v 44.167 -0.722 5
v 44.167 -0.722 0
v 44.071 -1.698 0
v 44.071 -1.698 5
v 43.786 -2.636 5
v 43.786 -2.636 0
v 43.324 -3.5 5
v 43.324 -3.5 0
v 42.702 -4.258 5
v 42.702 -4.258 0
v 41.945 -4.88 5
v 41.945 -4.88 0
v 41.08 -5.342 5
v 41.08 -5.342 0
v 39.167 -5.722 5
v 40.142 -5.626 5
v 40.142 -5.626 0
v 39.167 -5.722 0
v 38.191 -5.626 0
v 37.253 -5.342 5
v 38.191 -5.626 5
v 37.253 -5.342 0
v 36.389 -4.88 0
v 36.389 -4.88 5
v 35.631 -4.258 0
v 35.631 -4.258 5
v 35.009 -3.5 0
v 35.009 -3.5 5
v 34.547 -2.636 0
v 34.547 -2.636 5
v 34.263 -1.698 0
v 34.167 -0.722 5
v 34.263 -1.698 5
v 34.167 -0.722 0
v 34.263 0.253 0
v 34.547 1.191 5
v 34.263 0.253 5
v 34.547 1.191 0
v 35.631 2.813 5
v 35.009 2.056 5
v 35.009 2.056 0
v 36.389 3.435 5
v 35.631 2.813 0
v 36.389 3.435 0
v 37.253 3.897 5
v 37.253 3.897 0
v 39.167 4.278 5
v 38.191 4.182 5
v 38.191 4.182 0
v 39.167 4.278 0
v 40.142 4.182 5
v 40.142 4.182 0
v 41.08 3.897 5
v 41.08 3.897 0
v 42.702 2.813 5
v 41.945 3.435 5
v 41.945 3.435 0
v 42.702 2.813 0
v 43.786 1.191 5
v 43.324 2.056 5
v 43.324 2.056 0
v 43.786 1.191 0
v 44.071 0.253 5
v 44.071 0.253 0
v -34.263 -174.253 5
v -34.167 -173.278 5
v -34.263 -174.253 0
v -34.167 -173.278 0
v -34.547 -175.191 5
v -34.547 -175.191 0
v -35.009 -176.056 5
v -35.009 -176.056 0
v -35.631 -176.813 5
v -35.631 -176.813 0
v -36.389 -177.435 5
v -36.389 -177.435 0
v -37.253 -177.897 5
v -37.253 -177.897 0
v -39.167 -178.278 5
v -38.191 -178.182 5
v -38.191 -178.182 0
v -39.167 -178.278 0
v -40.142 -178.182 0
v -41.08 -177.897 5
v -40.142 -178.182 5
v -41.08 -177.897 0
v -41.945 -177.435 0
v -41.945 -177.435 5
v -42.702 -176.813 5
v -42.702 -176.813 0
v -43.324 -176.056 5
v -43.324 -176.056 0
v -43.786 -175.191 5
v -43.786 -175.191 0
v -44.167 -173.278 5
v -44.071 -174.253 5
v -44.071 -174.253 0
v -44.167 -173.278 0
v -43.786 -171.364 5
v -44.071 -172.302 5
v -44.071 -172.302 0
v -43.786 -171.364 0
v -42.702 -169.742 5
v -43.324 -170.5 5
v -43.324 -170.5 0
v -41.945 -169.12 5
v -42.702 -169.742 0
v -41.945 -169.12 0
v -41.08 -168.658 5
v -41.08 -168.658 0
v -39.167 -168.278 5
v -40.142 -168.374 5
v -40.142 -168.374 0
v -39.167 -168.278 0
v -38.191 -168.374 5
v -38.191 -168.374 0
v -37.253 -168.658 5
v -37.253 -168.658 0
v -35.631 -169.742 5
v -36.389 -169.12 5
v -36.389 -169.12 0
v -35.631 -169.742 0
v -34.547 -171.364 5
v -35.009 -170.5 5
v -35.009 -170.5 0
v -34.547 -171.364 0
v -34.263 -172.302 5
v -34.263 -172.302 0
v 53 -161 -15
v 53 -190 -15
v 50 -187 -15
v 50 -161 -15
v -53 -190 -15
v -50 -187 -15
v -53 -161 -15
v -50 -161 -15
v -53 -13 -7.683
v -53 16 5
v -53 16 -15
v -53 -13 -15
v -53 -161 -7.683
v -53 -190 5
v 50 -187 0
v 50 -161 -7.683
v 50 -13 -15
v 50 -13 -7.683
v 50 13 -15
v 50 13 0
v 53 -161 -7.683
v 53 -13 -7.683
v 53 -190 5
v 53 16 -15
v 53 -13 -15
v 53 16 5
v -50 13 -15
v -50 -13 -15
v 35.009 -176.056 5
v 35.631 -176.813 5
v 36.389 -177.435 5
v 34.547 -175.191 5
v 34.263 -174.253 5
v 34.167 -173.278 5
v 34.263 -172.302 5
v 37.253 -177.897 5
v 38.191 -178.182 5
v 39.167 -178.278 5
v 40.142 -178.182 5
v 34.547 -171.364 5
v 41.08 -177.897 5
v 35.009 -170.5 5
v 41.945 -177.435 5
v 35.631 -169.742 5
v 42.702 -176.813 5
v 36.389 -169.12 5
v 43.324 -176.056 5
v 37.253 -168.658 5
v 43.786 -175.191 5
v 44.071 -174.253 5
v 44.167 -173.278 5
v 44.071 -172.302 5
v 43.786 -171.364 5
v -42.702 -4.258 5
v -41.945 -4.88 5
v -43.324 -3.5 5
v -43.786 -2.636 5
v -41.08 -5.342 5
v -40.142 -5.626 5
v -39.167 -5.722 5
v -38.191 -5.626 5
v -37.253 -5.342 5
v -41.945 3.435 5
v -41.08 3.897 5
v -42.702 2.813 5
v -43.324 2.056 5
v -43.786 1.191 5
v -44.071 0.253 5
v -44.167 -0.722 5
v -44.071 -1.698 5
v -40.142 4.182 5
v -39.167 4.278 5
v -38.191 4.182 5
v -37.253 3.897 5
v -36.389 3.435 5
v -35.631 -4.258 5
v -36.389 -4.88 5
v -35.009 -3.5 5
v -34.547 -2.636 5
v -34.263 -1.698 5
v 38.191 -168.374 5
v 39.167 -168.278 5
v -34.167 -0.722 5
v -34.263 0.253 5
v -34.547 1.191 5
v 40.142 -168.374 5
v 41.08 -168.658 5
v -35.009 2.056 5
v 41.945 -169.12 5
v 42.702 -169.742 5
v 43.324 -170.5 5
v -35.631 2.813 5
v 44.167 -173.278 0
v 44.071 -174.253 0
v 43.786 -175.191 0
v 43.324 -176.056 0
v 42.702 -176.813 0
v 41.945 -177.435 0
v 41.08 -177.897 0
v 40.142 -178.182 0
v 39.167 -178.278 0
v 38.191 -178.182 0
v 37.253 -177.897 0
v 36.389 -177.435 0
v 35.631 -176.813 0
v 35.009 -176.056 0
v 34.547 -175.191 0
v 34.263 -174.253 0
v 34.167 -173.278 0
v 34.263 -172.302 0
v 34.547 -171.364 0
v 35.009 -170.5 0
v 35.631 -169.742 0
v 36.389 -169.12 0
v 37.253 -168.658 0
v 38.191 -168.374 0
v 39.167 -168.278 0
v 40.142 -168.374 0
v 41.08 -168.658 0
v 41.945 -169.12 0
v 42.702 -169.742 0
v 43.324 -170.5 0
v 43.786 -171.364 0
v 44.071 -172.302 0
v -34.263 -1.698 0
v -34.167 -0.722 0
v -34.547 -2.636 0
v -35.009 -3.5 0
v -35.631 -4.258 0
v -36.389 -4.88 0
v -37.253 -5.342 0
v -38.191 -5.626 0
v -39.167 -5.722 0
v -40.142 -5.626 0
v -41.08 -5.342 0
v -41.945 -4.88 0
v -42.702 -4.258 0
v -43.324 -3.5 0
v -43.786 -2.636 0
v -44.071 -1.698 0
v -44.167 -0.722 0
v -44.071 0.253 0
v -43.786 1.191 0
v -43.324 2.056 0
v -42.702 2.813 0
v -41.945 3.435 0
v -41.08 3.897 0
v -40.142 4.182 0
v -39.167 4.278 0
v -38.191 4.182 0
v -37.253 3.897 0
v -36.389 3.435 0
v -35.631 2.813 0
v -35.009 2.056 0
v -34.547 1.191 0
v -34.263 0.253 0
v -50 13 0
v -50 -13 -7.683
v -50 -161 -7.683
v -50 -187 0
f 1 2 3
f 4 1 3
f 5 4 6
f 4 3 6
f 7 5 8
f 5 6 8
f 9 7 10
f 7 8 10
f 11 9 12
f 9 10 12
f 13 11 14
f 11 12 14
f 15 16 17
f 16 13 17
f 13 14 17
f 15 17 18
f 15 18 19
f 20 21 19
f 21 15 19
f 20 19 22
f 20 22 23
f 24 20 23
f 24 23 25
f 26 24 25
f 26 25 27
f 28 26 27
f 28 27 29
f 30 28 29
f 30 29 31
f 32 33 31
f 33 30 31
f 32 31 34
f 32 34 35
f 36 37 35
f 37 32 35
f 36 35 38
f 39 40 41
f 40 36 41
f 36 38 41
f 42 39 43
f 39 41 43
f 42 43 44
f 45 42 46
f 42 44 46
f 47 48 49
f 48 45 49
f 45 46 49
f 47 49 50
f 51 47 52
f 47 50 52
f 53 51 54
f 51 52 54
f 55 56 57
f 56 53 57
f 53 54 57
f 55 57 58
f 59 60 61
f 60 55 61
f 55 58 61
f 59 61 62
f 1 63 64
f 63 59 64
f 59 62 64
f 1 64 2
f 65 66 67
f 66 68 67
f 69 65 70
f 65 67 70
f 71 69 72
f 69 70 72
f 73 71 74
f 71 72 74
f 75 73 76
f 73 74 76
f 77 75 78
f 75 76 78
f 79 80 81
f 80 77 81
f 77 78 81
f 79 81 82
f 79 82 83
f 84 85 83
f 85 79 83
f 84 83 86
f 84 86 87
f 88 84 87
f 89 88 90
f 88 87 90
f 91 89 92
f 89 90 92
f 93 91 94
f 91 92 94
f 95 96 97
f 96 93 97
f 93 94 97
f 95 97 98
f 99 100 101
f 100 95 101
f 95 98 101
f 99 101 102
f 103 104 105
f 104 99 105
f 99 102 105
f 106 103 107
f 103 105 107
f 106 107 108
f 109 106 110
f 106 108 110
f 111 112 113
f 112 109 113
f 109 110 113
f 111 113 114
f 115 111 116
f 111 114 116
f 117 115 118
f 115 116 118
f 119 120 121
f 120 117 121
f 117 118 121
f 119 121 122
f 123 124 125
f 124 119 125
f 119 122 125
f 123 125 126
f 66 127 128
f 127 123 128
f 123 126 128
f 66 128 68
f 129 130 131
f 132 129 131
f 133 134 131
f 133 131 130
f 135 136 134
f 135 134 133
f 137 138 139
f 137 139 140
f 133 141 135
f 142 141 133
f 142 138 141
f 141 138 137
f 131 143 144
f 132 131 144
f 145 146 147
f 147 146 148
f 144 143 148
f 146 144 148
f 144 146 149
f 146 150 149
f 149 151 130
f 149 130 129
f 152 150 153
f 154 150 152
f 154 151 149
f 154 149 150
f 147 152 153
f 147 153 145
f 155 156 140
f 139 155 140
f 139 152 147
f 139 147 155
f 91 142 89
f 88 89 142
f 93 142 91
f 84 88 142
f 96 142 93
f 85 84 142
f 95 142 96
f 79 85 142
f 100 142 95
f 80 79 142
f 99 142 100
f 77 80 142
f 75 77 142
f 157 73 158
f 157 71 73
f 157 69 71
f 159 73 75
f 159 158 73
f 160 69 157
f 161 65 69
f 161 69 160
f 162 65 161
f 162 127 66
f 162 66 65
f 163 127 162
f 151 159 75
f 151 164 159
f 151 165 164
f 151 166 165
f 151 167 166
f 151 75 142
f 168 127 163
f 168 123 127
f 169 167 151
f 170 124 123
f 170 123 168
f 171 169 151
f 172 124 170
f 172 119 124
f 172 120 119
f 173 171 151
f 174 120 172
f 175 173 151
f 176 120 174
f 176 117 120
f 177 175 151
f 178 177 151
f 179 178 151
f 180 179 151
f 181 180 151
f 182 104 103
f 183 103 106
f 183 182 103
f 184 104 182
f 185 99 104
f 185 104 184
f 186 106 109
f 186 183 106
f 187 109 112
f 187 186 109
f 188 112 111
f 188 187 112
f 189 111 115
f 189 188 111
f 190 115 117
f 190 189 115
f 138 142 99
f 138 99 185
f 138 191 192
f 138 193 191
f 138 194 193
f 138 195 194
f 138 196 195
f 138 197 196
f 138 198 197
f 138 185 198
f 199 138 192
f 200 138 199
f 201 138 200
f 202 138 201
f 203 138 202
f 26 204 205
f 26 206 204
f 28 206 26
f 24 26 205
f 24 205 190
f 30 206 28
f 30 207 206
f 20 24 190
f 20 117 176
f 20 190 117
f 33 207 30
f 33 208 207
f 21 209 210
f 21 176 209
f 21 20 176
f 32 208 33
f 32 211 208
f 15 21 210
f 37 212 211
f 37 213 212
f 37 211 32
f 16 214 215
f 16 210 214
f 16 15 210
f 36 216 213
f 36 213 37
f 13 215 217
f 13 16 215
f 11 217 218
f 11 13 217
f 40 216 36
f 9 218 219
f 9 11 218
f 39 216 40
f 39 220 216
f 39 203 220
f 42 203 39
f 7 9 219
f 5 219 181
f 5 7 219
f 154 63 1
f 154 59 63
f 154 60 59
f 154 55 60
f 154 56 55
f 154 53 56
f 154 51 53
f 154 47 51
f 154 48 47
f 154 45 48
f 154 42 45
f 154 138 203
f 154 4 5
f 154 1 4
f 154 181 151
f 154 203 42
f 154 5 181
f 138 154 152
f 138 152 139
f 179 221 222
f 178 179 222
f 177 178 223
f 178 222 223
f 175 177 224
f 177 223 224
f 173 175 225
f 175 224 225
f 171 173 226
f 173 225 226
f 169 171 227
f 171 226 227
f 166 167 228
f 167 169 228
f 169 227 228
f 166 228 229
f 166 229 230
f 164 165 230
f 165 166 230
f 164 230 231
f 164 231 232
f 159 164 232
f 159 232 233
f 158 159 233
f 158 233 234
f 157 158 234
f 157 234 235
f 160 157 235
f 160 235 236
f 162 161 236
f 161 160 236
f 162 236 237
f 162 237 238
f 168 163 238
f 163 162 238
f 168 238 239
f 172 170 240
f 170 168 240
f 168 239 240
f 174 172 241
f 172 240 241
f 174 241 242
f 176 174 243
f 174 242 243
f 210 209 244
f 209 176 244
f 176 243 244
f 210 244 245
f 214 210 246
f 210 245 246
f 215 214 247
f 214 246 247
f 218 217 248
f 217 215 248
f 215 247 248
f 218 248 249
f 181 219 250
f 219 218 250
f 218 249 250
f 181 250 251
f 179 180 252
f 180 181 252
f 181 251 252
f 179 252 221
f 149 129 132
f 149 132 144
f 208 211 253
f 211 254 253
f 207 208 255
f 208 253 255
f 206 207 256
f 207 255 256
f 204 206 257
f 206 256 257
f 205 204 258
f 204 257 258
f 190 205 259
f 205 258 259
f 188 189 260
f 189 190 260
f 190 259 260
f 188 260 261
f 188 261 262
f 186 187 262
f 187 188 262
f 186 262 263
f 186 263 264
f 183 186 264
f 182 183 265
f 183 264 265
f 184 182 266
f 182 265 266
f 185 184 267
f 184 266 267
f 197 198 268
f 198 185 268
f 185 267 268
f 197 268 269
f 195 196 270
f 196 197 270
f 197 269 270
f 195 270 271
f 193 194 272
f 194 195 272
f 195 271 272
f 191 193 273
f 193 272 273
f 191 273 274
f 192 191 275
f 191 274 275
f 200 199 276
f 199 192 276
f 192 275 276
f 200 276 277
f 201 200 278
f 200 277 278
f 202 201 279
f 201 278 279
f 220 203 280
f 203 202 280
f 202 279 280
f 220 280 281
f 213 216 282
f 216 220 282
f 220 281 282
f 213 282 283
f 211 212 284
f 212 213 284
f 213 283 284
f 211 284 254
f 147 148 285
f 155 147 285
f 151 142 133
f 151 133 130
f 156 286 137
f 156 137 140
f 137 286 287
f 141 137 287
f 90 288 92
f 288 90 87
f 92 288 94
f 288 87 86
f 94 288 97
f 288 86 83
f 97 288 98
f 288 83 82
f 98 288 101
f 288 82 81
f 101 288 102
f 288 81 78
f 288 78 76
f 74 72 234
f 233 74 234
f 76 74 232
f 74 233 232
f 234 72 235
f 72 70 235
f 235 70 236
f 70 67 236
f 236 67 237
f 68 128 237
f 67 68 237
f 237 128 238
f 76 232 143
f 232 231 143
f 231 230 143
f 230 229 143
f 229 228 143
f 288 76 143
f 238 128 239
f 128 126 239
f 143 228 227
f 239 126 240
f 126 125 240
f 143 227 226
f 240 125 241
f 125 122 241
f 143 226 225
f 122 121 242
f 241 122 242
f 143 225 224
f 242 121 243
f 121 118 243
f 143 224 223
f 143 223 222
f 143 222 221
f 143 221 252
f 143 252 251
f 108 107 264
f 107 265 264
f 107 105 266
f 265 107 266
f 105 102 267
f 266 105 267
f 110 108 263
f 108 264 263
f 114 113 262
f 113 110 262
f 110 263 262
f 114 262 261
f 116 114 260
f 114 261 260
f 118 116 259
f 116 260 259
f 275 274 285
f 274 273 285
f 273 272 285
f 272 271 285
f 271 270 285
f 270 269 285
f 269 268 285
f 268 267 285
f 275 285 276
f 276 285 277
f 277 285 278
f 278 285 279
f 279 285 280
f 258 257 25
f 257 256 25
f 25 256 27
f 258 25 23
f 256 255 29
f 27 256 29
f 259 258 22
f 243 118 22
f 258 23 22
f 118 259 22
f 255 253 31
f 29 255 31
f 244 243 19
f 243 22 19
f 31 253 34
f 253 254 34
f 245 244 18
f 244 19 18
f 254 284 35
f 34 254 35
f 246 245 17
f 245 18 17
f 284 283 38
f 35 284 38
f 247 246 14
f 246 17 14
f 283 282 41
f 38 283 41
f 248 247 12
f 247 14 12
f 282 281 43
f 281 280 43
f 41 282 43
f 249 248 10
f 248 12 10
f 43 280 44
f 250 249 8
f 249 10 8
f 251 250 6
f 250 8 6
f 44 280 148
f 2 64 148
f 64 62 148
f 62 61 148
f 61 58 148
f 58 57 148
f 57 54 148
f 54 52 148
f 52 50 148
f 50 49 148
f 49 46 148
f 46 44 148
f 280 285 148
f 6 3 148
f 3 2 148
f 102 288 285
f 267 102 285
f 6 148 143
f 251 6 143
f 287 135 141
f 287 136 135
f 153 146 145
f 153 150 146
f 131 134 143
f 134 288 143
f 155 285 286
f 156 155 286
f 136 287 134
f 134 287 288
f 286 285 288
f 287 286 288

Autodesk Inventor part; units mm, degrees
ref_plane "YZ Plane" through (0, 0, 0) normal (1, 0, 0) x (0, 1, 0)
ref_plane "XZ Plane" through (0, 0, 0) normal (0, 1, 0) x (-1, 0, 0)
ref_plane "Work Plane1" through (0, 0, 0) normal (0, 0, 1) x (1, 0, 0)
sketch "Sketch1" plane through (0, 0, 0) normal (0, 0, 1) x (1, 0, 0)
  circle A0 centre (39.1667, -0.7223) radius 5 projected
  circle A1 centre (-39.1667, -0.7223) radius 5 projected
  line L0 (-50, -13) -> (-28.3333, -13) projected
  line L1 (-28.3333, -13) -> (-28.3333, 10) projected
  line L2 (-28.3333, 10) -> (28.3333, 10) projected
  line L3 (28.3333, -13) -> (28.3333, 10) projected
  line L4 (28.3333, -13) -> (50, -13) projected
  line L5 (50, -13) -> (50, 13) projected
  line L6 (50, 13) -> (-50, 13) projected
  line L7 (-50, 13) -> (-50, -13) projected
  line L8 (28.3333, -161) -> (31.3333, -161) projected
  line L9 (31.3333, -161) -> (31.3333, -13) projected
  line L10 (31.3333, -13) -> (28.3333, -13) projected
  line L11 (28.3333, -13) -> (28.3333, -161) projected
  circle A2 centre (39.1667, -173.2777) radius 5 projected
  circle A3 centre (-39.1667, -173.2777) radius 5 projected
  line L12 (50, -161) -> (28.3333, -161) projected
  line L13 (28.3333, -161) -> (28.3333, -184) projected
  line L14 (28.3333, -184) -> (-28.3333, -184) projected
  line L15 (-28.3333, -161) -> (-28.3333, -184) projected
  line L16 (-28.3333, -161) -> (-50, -161) projected
  line L17 (-50, -161) -> (-50, -187) projected
  line L18 (-50, -187) -> (50, -187) projected
  line L19 (50, -187) -> (50, -161) projected
  line L20 (-31.3333, -161) -> (-28.3333, -161) projected
  line L21 (-28.3333, -161) -> (-28.3333, -13) projected
  line L22 (-28.3333, -13) -> (-31.3333, -13) projected
  line L23 (-31.3333, -13) -> (-31.3333, -161) projected
  line L24 (-31.3333, -161) -> (-28.3333, -161) projected
  line L25 (-28.3333, -161) -> (-28.3333, -13) projected
  line L26 (-28.3333, -13) -> (-31.3333, -13) projected
  line L27 (-31.3333, -13) -> (-31.3333, -161) projected
  line L28 (53, 16) -> (-53, 16)
  line L29 (-53, 16) -> (-53, -187)
  line L30 (53, -187) -> (53, 16)
  line L31 (53, 16) -> (-53, -187) construction
  line L32 (-53, 16) -> (53, -187) construction
  line L33 (53, -187) -> (53, -190)
  line L34 (53, -190) -> (-53, -190)
  line L35 (-53, -190) -> (-53, -187)
  point P0 (0, 0)
  point P1 (0, -85.5)
  dimension "d0" = 106
  dimension "d1" = 203
  dimension "d2" = 3
extrude "Extrusion1" add sketch "Sketch1" along normal blind 5 contours L7 L6 L5 L4 L3 L2 L1 L0 | L0 L21 L16 L23 | L1 L2 L3 L11 L13 L14 L15 L21 | L16 L15 L14 L13 L8 L12 L19 L18 L17 | L9 L8 L11 L4 | L30 L33 L34 L35 L29 L28
sketch "Sketch2" plane through (0, 0, 0) normal (0, 0, -1) x (-1, 0, 0)
  line L0 (-53, 16) -> (53, 16) projected
  line L1 (-53, -190) -> (-53, 16) projected
  line L2 (53, -190) -> (-53, -190) projected
  line L3 (53, 16) -> (53, -190) projected
  line L4 (-50, 13) -> (50, 13)
  line L5 (50, 13) -> (50, -187)
  line L6 (50, -187) -> (-50, -187)
  line L7 (-50, -187) -> (-50, 13)
  point P0 (0, 0)
  dimension "d5" = 3
extrude "Extrusion2" add sketch "Sketch2" along normal blind 15
sketch "Sketch3" plane through (53, -190, 5) normal (1, 0, 0) x (0, 0, -1)
  line L0 (0, 206) -> (20, 206) projected
  line L1 (0, 0) -> (0, 206) projected
  line L2 (20, 0) -> (0, 0) projected
  line L3 (20, 206) -> (20, 0) projected
  point P0 (5, 190)
sketch "Sketch4" plane through (53, -190, 5) normal (1, 0, 0) x (0, 0, -1)
  line L0 (0, 0) -> (0, 206) projected
  line L1 (20, 206) -> (20, 0) projected
  line L2 (5, 177) -> (58, 177) projected
  line L3 (20, 177) -> (0, 177)
  line L4 (58, 29) -> (5, 29) projected
  line L5 (20, 29) -> (0, 29)
  line L6 (12.6827, 177) -> (12.6827, 29)
  point P0 (5, 190)
extrude "Extrusion3" cut sketch "Sketch4" against normal up to surface (106 mm away) contours L6 L2 L1 L4
properties part number "bawah"
